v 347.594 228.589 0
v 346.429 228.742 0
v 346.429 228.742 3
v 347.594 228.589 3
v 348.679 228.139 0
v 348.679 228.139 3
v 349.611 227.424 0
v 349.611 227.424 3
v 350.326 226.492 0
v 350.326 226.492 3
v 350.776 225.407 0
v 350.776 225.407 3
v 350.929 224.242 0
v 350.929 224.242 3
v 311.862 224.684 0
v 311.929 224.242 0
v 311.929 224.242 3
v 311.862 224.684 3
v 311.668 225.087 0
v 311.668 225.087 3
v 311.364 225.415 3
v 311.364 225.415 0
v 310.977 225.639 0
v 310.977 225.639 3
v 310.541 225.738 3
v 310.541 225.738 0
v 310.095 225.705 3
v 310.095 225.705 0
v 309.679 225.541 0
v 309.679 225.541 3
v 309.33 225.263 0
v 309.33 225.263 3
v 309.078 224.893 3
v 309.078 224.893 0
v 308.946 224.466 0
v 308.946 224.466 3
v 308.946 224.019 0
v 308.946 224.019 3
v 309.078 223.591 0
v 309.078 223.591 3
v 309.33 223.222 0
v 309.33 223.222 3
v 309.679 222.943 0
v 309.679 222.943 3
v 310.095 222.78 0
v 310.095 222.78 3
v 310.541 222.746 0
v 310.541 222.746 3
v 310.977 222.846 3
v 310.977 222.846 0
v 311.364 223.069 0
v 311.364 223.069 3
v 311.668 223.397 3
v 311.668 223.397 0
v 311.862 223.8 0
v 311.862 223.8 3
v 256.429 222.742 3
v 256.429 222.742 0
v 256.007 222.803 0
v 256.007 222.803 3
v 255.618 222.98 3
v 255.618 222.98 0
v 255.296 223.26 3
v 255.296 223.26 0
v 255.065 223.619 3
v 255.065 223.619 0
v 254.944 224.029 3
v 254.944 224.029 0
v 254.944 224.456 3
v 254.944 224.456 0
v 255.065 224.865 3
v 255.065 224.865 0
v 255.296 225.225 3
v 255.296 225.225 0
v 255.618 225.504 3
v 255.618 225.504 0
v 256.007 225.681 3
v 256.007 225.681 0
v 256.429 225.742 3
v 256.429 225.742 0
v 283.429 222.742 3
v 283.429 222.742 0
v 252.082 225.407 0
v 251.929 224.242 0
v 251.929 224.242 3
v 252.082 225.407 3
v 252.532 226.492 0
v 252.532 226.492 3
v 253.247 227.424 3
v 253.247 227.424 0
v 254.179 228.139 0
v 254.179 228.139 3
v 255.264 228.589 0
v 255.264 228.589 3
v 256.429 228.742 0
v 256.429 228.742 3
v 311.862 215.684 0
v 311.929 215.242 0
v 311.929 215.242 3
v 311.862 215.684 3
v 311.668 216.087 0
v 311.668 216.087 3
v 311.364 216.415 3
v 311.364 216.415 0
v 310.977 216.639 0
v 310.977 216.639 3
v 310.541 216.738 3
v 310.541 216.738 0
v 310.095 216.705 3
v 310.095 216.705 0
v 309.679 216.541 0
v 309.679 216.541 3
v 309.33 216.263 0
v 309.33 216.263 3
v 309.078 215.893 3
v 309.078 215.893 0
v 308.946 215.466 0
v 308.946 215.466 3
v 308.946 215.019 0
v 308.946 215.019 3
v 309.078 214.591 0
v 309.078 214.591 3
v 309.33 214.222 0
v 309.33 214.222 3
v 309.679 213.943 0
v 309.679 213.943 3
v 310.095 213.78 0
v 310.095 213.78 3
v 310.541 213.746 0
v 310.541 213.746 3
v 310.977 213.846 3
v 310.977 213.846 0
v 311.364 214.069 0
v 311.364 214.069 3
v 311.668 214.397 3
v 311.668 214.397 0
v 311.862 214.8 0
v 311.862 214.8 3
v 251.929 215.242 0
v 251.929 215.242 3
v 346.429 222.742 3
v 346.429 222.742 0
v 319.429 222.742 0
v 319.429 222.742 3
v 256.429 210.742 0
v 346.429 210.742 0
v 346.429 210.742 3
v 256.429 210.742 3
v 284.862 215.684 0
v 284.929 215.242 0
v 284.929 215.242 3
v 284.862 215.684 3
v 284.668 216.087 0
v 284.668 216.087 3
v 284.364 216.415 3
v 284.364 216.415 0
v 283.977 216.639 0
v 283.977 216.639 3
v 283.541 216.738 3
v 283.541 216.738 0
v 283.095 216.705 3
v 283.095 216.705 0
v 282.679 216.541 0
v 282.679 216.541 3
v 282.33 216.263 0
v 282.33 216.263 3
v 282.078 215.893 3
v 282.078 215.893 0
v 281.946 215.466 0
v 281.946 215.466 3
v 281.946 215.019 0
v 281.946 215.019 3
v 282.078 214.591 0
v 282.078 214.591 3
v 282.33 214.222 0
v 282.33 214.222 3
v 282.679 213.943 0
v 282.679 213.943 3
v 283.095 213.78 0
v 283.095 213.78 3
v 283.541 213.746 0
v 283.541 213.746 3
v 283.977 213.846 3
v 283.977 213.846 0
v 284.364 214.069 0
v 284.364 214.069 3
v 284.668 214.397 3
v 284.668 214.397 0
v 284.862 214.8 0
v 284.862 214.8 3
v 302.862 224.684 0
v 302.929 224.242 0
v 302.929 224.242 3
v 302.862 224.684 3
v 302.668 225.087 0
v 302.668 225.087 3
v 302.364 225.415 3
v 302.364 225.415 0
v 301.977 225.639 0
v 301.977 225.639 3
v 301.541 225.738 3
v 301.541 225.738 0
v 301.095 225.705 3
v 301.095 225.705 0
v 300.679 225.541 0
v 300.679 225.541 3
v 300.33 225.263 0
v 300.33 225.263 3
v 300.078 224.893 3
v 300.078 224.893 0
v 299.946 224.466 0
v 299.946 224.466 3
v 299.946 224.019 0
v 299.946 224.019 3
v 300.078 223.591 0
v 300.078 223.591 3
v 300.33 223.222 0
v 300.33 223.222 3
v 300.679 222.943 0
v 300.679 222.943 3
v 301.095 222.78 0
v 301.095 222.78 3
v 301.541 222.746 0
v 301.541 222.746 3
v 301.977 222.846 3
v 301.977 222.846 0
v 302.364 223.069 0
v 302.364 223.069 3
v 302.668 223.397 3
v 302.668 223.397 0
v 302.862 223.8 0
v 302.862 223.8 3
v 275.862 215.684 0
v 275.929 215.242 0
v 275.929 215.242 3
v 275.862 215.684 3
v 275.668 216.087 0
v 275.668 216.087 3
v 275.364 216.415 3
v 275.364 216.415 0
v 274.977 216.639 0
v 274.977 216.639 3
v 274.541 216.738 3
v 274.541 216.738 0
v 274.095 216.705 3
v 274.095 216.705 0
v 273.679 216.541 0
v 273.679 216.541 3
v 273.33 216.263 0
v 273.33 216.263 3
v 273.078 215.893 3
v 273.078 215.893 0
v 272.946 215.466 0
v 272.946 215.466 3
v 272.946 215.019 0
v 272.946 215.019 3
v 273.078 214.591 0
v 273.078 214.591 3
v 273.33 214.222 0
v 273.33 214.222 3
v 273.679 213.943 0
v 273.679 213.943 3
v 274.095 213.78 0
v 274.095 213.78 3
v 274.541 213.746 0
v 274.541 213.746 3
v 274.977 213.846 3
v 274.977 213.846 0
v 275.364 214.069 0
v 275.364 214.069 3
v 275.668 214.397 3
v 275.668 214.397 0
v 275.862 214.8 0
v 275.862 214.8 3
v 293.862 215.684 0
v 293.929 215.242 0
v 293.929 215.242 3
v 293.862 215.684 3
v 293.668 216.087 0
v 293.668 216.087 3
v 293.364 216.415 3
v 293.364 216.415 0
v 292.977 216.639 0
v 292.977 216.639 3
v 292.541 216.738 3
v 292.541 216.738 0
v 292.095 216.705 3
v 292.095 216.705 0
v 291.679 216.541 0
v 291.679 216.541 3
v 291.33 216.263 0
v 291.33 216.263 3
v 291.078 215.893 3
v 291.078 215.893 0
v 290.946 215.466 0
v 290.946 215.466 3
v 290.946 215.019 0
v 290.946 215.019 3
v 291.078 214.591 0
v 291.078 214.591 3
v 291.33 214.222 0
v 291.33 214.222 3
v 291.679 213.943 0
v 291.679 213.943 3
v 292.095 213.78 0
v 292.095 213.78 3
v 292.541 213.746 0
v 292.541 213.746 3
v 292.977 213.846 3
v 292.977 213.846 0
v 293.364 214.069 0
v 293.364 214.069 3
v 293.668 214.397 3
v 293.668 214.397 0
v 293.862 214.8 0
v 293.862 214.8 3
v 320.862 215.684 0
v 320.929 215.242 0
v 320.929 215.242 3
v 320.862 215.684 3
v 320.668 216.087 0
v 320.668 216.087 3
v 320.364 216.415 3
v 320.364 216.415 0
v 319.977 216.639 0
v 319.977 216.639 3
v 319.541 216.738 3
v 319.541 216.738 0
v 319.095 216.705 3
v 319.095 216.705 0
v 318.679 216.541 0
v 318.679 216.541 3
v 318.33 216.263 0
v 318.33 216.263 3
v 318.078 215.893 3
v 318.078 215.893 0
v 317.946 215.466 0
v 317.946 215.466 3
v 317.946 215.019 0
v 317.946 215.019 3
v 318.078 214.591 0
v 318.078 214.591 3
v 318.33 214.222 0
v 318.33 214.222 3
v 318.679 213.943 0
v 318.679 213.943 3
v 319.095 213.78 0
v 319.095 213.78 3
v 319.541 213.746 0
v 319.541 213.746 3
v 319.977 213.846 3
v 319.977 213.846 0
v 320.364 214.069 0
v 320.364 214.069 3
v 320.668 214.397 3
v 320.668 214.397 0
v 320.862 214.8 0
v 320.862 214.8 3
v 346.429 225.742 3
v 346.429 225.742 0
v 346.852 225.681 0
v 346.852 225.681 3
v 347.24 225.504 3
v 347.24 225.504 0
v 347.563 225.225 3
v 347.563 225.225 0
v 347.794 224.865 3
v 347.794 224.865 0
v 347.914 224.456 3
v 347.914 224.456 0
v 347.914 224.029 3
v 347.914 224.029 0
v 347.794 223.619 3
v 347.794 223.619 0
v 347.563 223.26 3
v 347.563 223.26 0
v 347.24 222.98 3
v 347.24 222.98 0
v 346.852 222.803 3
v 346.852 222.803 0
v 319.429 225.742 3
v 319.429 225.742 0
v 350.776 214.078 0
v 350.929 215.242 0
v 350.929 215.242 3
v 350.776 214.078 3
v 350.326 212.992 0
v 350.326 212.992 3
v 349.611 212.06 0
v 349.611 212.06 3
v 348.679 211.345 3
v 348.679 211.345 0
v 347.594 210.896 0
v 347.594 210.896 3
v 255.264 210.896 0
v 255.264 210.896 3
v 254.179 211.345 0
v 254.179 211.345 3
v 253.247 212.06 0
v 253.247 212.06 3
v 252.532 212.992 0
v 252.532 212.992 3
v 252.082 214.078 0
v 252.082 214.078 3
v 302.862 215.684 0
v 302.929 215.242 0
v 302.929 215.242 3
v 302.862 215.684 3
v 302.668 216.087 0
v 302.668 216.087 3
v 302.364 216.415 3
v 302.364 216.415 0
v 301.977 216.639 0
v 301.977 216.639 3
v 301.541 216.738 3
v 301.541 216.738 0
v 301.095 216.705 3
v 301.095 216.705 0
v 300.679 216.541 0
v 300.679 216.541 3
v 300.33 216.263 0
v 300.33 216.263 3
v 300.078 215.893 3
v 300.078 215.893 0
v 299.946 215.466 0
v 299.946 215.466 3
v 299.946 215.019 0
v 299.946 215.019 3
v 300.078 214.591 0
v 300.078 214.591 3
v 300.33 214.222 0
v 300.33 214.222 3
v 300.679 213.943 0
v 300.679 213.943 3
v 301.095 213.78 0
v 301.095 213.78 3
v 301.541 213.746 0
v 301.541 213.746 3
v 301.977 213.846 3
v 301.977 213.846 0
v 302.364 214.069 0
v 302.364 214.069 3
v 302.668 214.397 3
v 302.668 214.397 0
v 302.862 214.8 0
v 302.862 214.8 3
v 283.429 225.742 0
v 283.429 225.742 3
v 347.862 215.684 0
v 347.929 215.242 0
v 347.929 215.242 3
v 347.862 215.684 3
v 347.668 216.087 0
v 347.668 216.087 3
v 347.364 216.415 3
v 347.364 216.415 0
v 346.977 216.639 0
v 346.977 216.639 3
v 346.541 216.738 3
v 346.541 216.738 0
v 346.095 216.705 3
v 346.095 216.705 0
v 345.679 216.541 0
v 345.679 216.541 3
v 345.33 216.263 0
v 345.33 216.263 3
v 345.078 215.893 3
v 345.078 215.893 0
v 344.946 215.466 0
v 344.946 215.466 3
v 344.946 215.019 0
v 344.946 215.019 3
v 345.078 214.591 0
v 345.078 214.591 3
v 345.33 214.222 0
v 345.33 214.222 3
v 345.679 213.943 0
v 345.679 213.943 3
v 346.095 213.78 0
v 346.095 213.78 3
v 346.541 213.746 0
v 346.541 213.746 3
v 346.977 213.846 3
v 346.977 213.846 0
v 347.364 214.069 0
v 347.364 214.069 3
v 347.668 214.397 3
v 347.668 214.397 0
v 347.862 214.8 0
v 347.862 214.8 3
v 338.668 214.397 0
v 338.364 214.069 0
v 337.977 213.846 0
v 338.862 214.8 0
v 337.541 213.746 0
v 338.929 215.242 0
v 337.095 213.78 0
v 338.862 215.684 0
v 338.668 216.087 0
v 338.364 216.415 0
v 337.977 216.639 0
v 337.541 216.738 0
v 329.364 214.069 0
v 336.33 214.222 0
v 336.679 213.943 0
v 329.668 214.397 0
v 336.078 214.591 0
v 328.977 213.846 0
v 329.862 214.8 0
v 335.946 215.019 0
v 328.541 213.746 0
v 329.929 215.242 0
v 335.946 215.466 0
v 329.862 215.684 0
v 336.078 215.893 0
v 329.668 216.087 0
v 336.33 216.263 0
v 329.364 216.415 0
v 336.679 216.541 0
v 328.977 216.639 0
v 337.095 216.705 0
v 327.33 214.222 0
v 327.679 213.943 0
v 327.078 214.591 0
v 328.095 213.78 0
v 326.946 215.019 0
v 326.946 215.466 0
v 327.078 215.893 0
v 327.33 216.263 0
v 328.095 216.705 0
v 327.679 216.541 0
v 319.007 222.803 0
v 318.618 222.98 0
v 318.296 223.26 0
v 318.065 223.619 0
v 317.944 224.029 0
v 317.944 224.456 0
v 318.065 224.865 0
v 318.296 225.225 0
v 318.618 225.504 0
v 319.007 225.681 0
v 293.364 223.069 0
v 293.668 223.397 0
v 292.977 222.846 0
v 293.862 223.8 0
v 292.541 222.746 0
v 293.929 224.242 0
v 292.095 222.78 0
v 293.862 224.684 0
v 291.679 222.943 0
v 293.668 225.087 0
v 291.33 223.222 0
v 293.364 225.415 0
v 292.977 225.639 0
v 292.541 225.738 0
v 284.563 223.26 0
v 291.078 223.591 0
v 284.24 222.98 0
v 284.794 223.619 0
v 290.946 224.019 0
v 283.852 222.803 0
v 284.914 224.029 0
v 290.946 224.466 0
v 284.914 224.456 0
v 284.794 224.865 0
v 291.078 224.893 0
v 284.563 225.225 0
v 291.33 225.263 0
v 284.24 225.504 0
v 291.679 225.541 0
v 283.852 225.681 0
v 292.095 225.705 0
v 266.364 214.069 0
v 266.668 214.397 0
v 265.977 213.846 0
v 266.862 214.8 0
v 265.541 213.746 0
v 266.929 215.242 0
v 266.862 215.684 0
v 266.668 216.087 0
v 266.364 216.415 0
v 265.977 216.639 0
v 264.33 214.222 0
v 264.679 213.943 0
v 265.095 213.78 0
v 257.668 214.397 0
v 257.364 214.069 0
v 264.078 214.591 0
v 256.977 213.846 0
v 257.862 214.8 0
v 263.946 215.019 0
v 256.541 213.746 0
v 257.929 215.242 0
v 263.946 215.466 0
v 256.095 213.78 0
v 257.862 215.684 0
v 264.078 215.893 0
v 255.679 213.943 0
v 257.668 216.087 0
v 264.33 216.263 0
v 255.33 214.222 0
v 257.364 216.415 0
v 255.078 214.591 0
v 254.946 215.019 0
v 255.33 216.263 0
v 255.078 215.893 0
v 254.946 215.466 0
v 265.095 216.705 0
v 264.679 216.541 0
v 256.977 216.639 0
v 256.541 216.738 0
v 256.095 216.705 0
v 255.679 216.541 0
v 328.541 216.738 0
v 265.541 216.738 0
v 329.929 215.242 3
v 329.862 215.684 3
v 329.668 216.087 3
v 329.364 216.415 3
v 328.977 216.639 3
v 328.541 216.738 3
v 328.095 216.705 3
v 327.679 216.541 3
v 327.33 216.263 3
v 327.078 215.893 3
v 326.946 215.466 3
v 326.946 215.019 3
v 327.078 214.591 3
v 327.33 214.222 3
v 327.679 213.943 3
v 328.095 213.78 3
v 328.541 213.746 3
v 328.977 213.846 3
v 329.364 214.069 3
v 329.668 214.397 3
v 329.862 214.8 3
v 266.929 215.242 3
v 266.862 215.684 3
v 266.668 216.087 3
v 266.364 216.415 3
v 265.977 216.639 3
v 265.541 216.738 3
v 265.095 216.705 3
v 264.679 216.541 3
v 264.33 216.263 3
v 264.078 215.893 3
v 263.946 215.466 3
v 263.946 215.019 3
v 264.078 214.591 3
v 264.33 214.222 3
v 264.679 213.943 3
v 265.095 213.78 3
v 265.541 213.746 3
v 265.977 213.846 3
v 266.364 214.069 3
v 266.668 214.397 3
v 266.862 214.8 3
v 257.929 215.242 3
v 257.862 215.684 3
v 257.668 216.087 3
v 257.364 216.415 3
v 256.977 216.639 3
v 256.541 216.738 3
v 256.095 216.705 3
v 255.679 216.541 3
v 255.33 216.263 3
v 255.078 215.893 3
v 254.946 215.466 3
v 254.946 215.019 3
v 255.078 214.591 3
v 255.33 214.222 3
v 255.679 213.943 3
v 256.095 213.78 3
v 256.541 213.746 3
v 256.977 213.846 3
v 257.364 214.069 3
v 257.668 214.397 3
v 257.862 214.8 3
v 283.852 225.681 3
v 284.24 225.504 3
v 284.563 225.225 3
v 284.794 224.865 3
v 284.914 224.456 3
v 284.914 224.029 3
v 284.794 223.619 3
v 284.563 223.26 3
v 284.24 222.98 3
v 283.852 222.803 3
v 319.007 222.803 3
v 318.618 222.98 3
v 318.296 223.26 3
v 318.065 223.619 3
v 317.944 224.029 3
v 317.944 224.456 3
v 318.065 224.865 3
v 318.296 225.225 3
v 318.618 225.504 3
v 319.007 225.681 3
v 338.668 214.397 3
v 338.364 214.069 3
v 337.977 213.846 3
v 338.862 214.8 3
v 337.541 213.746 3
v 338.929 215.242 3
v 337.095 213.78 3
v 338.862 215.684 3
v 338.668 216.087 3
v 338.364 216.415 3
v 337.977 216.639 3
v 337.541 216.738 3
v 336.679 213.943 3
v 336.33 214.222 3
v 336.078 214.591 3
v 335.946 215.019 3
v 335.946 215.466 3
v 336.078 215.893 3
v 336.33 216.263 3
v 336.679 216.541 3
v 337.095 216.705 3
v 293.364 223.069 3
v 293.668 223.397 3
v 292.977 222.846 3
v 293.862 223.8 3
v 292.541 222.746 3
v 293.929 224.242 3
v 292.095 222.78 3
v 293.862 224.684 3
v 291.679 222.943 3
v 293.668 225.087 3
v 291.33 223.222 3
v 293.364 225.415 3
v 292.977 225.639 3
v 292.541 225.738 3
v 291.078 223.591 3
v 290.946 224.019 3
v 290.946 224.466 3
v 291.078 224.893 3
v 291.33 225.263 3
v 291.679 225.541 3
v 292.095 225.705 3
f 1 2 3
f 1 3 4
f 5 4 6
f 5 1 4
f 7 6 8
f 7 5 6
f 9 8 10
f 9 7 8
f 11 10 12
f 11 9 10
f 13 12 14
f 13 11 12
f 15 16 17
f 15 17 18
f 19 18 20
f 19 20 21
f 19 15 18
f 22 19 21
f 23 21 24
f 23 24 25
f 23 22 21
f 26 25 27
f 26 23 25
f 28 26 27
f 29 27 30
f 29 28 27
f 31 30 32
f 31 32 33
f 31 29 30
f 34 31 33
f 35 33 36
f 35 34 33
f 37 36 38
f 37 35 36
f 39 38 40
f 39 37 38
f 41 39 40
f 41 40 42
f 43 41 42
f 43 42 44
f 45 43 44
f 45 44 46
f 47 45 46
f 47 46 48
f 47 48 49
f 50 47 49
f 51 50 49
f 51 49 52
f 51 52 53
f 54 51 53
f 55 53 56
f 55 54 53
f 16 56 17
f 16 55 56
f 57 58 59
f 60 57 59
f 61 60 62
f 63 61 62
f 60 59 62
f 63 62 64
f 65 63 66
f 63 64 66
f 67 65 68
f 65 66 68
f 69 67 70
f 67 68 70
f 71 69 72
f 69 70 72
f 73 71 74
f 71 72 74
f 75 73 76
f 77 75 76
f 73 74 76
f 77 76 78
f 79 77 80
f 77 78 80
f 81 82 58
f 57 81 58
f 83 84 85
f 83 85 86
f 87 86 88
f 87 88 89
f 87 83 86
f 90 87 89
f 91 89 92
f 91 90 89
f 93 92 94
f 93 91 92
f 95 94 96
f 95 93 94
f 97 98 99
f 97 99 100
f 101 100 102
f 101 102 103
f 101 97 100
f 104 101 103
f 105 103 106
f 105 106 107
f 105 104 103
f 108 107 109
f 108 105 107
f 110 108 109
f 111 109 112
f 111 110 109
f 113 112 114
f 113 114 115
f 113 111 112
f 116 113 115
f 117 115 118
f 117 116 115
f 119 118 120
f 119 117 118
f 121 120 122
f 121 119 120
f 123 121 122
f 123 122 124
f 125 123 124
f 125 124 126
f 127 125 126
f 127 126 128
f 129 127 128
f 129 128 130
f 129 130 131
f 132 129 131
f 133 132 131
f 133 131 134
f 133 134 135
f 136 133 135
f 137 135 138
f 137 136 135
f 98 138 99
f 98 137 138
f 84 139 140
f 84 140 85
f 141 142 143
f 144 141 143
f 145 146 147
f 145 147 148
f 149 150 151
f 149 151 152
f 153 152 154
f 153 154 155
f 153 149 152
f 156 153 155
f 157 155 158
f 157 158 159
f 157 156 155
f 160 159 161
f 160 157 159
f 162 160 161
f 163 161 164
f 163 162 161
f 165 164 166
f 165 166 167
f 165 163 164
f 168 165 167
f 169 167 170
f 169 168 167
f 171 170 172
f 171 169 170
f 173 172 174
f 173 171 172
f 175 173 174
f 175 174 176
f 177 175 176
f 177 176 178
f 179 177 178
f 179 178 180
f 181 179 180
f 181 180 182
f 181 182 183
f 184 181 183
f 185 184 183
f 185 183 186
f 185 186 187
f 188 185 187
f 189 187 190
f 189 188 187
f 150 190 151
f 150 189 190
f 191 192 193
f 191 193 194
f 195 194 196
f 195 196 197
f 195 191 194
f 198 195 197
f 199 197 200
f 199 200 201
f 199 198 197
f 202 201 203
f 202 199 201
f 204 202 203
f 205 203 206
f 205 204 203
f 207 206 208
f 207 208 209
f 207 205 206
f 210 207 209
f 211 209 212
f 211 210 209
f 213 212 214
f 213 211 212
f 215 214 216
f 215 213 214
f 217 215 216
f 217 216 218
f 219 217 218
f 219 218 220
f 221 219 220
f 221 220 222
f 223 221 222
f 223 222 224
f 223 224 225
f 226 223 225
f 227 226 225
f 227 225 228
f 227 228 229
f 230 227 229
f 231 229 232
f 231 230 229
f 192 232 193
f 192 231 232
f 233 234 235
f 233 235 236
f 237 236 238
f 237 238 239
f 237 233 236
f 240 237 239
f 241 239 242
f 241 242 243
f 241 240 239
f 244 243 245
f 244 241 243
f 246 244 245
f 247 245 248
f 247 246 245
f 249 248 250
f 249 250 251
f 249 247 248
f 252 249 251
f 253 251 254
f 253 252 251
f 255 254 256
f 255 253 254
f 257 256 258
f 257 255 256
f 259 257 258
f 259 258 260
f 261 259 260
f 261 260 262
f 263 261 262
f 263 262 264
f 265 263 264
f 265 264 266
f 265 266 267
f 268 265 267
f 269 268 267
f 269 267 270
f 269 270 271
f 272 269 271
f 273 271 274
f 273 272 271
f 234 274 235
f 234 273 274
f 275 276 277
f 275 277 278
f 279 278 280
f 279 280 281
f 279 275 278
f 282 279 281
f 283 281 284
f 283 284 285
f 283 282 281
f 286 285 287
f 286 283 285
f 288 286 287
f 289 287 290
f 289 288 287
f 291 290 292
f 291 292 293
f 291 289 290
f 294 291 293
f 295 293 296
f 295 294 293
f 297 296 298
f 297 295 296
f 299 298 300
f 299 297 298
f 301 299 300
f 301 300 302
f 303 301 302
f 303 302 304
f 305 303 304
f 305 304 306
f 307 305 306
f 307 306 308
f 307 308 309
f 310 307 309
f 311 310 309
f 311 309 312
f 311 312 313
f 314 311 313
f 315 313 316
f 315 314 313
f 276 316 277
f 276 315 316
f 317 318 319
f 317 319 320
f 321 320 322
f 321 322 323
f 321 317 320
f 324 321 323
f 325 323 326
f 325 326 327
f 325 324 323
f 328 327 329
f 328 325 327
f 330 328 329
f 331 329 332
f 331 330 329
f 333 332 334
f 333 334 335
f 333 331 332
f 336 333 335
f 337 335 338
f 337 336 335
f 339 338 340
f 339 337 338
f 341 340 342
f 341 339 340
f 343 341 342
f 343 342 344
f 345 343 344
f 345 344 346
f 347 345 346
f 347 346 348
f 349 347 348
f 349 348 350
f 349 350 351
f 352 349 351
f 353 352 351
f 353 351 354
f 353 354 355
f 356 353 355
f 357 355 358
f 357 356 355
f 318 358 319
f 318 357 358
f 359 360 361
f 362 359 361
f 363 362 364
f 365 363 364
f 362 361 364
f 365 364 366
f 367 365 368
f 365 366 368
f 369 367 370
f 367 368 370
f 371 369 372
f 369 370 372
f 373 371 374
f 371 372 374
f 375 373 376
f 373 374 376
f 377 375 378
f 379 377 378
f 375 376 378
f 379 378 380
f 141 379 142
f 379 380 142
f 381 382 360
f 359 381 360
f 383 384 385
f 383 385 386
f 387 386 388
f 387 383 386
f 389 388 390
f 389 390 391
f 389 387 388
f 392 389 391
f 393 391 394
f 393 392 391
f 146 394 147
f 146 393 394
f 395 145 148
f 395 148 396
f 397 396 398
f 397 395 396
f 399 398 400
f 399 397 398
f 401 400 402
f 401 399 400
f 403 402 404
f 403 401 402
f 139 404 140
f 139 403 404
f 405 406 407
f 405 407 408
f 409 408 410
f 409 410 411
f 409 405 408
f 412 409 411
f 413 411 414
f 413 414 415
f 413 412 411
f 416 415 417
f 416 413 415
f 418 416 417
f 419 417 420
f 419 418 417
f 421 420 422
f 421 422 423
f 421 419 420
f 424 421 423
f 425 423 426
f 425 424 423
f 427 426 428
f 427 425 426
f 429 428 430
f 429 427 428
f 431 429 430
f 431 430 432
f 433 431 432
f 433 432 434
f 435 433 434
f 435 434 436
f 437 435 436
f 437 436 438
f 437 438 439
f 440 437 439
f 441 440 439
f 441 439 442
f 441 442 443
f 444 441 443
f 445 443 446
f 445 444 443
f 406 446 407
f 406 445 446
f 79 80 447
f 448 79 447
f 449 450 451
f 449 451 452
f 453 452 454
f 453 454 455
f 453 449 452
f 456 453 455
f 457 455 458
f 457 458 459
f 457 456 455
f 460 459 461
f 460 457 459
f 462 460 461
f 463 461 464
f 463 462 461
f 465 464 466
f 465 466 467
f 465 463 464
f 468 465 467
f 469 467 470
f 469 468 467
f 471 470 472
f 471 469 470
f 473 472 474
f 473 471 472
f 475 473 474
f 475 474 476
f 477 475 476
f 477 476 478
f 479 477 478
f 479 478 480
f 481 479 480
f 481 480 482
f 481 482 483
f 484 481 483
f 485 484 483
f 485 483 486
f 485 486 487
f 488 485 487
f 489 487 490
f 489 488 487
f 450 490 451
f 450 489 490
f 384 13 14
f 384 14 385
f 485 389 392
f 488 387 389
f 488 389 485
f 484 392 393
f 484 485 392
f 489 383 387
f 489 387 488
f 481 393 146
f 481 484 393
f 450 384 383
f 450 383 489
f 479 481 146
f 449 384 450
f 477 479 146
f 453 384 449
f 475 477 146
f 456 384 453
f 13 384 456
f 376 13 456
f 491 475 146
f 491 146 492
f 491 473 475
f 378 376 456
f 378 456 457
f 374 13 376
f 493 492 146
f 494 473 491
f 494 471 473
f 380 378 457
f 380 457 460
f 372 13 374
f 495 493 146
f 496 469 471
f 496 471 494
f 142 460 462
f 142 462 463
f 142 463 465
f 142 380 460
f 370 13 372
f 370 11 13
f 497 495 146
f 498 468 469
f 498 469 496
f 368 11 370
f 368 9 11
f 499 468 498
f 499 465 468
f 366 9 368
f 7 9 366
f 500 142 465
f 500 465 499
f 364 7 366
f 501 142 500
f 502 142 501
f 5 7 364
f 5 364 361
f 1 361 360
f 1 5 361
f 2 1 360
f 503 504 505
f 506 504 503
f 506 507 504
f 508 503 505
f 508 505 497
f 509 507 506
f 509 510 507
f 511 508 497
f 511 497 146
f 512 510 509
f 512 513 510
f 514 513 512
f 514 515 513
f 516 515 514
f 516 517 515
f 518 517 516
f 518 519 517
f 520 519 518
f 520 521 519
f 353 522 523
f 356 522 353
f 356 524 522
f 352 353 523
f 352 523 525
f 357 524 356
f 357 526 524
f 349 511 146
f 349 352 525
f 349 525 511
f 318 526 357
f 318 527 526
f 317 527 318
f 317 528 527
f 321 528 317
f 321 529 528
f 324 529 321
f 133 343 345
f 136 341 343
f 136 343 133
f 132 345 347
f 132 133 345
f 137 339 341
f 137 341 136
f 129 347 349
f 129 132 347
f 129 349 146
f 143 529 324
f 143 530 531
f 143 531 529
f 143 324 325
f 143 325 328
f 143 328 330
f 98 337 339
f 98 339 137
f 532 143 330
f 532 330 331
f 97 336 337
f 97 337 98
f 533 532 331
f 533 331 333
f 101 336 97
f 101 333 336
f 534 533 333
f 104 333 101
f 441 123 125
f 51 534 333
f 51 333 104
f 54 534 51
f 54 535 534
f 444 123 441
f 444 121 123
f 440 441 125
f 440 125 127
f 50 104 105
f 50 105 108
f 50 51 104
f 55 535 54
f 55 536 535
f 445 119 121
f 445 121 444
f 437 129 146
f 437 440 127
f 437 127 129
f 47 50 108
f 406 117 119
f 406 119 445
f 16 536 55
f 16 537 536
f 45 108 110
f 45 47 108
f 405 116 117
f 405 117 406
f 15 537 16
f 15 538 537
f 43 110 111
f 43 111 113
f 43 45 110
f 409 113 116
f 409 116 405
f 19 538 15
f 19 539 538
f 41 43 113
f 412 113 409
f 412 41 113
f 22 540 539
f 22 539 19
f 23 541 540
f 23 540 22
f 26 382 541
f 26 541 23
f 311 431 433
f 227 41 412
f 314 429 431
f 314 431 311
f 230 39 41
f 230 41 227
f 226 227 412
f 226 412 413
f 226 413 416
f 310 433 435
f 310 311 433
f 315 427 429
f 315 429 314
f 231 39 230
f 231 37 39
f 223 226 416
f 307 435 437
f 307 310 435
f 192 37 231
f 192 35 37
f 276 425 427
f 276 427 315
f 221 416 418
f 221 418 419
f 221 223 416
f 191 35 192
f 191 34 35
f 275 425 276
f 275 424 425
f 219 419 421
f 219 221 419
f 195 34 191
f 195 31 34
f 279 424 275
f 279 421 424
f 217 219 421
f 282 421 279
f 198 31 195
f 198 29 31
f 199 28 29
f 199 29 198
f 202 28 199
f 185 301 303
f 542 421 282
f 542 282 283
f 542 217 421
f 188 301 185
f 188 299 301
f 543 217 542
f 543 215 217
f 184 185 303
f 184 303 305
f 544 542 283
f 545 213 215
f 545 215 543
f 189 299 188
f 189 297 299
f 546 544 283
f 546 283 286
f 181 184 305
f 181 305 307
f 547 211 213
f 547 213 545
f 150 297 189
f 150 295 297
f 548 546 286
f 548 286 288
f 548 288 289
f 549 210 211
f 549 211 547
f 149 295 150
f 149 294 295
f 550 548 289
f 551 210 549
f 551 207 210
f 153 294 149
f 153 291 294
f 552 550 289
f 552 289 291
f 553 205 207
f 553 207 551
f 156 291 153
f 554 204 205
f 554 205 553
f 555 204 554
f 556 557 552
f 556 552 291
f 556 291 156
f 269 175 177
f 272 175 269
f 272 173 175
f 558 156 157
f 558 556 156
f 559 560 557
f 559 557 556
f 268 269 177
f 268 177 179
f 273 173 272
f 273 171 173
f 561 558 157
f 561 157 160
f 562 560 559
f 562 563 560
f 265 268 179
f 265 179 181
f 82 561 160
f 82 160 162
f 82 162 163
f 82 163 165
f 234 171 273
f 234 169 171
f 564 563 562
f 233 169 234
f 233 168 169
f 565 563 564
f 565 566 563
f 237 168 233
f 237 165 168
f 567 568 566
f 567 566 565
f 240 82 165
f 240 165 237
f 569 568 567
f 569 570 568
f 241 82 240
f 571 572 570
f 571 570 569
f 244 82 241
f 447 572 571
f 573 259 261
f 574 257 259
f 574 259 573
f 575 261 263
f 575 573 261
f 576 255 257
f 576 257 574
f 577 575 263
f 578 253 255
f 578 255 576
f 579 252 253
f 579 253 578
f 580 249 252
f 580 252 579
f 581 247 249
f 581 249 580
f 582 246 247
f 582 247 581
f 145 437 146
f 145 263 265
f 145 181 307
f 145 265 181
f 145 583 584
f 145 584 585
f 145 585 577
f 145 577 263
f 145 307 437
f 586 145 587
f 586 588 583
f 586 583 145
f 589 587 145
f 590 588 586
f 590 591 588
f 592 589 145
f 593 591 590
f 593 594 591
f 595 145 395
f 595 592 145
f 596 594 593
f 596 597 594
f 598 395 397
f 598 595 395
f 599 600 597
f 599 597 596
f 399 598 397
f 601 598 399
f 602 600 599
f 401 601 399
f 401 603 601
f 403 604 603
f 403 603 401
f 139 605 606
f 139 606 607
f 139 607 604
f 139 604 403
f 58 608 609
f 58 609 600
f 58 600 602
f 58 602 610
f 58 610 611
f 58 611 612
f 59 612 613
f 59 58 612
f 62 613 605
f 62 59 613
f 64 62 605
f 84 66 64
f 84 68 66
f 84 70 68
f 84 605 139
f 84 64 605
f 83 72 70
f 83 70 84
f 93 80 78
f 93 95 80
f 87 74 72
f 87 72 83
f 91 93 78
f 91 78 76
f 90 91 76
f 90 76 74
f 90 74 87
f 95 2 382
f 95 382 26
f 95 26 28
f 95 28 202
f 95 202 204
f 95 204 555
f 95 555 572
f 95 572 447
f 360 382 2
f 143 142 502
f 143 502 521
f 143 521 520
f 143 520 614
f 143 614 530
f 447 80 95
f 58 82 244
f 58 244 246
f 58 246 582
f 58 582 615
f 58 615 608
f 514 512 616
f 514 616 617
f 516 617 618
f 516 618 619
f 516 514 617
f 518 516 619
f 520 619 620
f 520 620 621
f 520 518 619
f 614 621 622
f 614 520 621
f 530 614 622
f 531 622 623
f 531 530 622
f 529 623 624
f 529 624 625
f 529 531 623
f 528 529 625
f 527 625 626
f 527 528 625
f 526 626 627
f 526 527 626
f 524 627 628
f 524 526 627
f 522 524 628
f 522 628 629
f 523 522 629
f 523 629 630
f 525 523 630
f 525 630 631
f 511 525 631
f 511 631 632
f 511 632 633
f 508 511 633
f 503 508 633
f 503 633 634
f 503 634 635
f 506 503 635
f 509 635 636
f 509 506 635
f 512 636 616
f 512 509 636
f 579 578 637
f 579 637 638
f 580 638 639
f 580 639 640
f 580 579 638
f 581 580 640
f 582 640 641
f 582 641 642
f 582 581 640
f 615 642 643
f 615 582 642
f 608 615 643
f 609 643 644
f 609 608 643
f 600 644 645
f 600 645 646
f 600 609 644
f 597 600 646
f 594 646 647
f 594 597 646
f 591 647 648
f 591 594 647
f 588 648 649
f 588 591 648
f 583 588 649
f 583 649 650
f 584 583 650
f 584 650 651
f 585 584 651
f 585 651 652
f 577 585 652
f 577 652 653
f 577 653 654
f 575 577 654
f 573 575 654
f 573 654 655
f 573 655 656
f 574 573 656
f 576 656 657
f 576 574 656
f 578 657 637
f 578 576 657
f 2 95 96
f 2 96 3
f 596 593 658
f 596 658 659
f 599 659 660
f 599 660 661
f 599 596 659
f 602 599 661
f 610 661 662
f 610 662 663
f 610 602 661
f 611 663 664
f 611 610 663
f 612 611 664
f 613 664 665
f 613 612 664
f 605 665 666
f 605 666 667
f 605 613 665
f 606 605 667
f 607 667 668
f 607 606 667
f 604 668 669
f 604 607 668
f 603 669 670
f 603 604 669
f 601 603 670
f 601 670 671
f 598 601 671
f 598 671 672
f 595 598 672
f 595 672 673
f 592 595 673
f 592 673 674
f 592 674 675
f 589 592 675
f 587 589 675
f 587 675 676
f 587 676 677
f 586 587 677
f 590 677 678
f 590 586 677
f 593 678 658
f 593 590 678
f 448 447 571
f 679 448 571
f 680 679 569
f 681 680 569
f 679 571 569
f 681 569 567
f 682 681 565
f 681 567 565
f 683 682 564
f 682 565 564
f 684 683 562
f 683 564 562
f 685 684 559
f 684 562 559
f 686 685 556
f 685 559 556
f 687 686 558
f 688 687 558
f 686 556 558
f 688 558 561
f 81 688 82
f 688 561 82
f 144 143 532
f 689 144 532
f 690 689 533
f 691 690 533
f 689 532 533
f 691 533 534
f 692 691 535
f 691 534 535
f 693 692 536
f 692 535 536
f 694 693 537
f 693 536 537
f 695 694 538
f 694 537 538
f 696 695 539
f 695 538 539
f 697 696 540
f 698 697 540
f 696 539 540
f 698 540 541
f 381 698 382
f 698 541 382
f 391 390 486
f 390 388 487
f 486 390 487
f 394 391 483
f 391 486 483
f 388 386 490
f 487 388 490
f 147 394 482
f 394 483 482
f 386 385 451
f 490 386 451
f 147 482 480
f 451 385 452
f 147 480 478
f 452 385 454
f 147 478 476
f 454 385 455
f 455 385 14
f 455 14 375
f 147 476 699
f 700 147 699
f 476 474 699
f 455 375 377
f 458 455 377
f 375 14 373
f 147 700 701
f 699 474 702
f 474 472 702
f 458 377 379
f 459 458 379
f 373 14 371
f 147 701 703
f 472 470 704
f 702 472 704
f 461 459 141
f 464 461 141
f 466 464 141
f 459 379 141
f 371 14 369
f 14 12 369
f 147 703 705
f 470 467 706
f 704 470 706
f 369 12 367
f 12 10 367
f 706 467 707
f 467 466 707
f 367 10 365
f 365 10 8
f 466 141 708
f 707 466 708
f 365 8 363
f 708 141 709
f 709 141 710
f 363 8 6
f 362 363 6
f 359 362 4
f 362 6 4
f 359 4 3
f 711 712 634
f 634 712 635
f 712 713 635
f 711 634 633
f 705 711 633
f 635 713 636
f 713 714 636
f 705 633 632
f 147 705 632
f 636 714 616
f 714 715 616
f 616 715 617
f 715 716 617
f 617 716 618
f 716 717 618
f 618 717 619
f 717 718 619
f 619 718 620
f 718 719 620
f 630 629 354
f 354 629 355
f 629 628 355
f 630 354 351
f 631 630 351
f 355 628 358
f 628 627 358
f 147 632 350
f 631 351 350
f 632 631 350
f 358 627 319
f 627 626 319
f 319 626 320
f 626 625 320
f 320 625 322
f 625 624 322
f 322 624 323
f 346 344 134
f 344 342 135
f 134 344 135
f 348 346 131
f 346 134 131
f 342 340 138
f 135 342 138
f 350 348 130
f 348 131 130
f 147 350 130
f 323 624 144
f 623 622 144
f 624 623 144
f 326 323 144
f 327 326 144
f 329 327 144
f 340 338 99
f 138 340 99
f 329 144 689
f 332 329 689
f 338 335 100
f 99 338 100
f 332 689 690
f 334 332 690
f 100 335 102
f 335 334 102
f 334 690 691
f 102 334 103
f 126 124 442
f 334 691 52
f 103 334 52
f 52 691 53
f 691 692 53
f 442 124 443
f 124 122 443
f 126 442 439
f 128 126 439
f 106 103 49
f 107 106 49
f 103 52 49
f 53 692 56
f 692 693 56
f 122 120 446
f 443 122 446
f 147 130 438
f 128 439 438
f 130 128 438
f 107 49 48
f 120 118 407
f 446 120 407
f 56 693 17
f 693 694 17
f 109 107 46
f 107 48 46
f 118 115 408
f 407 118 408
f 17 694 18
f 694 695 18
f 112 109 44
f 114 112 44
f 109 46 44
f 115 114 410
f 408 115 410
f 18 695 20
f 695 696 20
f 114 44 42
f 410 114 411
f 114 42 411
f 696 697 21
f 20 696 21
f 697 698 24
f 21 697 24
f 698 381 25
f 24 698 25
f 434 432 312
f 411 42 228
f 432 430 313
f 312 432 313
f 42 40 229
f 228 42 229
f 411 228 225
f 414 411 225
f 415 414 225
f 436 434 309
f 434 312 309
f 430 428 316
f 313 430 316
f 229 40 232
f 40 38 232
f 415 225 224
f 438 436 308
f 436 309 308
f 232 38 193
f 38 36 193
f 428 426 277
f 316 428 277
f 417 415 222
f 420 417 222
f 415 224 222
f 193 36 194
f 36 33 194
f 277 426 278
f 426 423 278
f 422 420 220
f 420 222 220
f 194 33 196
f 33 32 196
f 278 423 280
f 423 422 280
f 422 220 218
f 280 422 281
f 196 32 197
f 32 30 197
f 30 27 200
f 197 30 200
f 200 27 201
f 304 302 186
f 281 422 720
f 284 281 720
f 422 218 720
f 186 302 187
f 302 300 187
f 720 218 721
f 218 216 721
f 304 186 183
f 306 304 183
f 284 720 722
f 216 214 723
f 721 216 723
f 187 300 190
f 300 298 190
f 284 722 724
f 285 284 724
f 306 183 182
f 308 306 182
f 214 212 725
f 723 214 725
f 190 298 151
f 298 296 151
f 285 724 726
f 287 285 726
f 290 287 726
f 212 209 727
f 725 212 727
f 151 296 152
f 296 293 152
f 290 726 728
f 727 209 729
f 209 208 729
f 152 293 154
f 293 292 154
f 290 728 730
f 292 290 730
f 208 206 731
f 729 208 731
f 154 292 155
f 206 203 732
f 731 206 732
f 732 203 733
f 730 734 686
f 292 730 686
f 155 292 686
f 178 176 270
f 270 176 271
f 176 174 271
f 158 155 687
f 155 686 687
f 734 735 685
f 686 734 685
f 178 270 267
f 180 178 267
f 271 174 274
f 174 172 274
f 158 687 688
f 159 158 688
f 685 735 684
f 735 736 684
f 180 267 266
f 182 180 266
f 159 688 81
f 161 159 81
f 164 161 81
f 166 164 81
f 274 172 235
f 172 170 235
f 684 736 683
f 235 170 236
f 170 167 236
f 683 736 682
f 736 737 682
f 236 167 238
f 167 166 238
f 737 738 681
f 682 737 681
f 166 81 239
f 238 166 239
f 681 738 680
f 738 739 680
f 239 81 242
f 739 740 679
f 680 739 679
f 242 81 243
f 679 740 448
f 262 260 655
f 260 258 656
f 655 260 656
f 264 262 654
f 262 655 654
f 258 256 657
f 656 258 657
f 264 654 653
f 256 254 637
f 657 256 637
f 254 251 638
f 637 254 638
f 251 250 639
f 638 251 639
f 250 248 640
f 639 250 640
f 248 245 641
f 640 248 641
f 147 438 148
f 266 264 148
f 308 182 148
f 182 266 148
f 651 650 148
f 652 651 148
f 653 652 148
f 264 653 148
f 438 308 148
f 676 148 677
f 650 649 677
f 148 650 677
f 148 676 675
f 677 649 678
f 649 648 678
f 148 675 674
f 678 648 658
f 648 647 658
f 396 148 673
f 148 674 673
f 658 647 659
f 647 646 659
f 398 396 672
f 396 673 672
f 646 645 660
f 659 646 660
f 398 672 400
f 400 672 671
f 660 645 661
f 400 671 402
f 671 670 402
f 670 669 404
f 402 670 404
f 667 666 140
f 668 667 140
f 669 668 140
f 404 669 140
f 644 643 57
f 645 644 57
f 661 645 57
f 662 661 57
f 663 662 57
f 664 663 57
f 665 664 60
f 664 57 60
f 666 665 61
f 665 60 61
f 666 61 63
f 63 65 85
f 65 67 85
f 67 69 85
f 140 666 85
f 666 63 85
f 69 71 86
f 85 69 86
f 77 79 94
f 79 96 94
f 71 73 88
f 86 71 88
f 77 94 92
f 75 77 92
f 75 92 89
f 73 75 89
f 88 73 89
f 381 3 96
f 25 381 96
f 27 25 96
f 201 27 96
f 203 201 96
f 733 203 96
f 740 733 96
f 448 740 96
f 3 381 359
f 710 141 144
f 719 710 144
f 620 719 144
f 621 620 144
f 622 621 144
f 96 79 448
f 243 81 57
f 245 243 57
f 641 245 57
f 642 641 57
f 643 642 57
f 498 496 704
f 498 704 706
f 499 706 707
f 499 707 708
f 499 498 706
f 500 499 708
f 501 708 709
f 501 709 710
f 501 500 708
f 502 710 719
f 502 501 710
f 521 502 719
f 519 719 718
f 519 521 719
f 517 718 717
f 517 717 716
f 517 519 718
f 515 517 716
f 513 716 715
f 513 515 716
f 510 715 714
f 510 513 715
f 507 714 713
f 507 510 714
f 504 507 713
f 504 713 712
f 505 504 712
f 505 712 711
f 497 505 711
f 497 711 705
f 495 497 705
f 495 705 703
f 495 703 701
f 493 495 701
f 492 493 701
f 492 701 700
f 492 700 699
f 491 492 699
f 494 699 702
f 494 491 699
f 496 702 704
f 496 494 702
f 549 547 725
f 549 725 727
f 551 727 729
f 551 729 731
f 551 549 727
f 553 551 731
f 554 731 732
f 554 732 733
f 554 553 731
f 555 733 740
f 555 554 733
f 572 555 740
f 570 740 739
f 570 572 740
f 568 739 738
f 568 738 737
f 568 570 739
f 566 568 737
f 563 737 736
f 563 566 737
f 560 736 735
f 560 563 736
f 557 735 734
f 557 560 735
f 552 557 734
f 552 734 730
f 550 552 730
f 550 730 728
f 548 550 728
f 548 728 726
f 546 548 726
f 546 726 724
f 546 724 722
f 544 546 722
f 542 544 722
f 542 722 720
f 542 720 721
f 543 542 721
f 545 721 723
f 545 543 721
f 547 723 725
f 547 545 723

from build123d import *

# Parameters (mm, degrees)
MODEL_R                 = 1.5
SALIENTE_EXTRUIR1_DEPTH = 3


with BuildPart() as part:
    # Model → Saliente-Extruir1 (new body)
    with BuildSketch(Plane.XY):
        with BuildLine():
            Line((256.429131311, 228.742243614), (346.429131311, 228.742243614))
            ThreePointArc((346.429131311, 228.742243614), (349.611111826, 227.424224129), (350.929131311, 224.242243614))
            Line((350.929131311, 224.242243614), (350.929131311, 215.242243614))
            ThreePointArc((350.929131311, 215.242243614), (349.611111826, 212.060263099), (346.429131311, 210.742243614))
            Line((346.429131311, 210.742243614), (256.429131311, 210.742243614))
            ThreePointArc((256.429131311, 210.742243614), (253.247150795, 212.060263099), (251.929131311, 215.242243614))
            Line((251.929131311, 215.242243614), (251.929131311, 224.242243614))
            ThreePointArc((251.929131311, 224.242243614), (253.247150795, 227.424224129), (256.429131311, 228.742243614))
        make_face()
        with Locations((310.429131311, 224.242243614)):
            Circle(MODEL_R, mode=Mode.SUBTRACT)
        with Locations((292.429131311, 224.242243614)):
            Circle(MODEL_R, mode=Mode.SUBTRACT)
        with Locations((301.429131311, 224.242243614)):
            Circle(MODEL_R, mode=Mode.SUBTRACT)
        with Locations((337.429131311, 215.242243614)):
            Circle(MODEL_R, mode=Mode.SUBTRACT)
        with Locations((319.429131311, 215.242243614)):
            Circle(MODEL_R, mode=Mode.SUBTRACT)
        with Locations((328.429131311, 215.242243614)):
            Circle(MODEL_R, mode=Mode.SUBTRACT)
        with Locations((310.429131311, 215.242243614)):
            Circle(MODEL_R, mode=Mode.SUBTRACT)
        with Locations((292.429131311, 215.242243614)):
            Circle(MODEL_R, mode=Mode.SUBTRACT)
        with Locations((301.429131311, 215.242243614)):
            Circle(MODEL_R, mode=Mode.SUBTRACT)
        with Locations((274.429131311, 215.242243614)):
            Circle(MODEL_R, mode=Mode.SUBTRACT)
        with Locations((283.429131311, 215.242243614)):
            Circle(MODEL_R, mode=Mode.SUBTRACT)
        with Locations((265.429131311, 215.242243614)):
            Circle(MODEL_R, mode=Mode.SUBTRACT)
        with Locations((256.429131311, 215.242243614)):
            Circle(MODEL_R, mode=Mode.SUBTRACT)
        with Locations((346.429131311, 215.242243614)):
            Circle(MODEL_R, mode=Mode.SUBTRACT)
        with BuildLine():
            Line((256.429131311, 225.742243614), (283.429131311, 225.742243614))
            ThreePointArc((283.429131311, 225.742243614), (284.929131311, 224.242243614), (283.429131311, 222.742243614))
            Line((283.429131311, 222.742243614), (256.429131311, 222.742243614))
            ThreePointArc((256.429131311, 222.742243614), (254.929131311, 224.242243614), (256.429131311, 225.742243614))
        make_face(mode=Mode.SUBTRACT)
        with BuildLine():
            Line((319.429131311, 225.742243614), (346.429131311, 225.742243614))
            ThreePointArc((346.429131311, 225.742243614), (347.929131311, 224.242243614), (346.429131311, 222.742243614))
            Line((346.429131311, 222.742243614), (319.429131311, 222.742243614))
            ThreePointArc((319.429131311, 222.742243614), (317.929131311, 224.242243614), (319.429131311, 225.742243614))
        make_face(mode=Mode.SUBTRACT)
    extrude(amount=SALIENTE_EXTRUIR1_DEPTH)


solid = part.part
